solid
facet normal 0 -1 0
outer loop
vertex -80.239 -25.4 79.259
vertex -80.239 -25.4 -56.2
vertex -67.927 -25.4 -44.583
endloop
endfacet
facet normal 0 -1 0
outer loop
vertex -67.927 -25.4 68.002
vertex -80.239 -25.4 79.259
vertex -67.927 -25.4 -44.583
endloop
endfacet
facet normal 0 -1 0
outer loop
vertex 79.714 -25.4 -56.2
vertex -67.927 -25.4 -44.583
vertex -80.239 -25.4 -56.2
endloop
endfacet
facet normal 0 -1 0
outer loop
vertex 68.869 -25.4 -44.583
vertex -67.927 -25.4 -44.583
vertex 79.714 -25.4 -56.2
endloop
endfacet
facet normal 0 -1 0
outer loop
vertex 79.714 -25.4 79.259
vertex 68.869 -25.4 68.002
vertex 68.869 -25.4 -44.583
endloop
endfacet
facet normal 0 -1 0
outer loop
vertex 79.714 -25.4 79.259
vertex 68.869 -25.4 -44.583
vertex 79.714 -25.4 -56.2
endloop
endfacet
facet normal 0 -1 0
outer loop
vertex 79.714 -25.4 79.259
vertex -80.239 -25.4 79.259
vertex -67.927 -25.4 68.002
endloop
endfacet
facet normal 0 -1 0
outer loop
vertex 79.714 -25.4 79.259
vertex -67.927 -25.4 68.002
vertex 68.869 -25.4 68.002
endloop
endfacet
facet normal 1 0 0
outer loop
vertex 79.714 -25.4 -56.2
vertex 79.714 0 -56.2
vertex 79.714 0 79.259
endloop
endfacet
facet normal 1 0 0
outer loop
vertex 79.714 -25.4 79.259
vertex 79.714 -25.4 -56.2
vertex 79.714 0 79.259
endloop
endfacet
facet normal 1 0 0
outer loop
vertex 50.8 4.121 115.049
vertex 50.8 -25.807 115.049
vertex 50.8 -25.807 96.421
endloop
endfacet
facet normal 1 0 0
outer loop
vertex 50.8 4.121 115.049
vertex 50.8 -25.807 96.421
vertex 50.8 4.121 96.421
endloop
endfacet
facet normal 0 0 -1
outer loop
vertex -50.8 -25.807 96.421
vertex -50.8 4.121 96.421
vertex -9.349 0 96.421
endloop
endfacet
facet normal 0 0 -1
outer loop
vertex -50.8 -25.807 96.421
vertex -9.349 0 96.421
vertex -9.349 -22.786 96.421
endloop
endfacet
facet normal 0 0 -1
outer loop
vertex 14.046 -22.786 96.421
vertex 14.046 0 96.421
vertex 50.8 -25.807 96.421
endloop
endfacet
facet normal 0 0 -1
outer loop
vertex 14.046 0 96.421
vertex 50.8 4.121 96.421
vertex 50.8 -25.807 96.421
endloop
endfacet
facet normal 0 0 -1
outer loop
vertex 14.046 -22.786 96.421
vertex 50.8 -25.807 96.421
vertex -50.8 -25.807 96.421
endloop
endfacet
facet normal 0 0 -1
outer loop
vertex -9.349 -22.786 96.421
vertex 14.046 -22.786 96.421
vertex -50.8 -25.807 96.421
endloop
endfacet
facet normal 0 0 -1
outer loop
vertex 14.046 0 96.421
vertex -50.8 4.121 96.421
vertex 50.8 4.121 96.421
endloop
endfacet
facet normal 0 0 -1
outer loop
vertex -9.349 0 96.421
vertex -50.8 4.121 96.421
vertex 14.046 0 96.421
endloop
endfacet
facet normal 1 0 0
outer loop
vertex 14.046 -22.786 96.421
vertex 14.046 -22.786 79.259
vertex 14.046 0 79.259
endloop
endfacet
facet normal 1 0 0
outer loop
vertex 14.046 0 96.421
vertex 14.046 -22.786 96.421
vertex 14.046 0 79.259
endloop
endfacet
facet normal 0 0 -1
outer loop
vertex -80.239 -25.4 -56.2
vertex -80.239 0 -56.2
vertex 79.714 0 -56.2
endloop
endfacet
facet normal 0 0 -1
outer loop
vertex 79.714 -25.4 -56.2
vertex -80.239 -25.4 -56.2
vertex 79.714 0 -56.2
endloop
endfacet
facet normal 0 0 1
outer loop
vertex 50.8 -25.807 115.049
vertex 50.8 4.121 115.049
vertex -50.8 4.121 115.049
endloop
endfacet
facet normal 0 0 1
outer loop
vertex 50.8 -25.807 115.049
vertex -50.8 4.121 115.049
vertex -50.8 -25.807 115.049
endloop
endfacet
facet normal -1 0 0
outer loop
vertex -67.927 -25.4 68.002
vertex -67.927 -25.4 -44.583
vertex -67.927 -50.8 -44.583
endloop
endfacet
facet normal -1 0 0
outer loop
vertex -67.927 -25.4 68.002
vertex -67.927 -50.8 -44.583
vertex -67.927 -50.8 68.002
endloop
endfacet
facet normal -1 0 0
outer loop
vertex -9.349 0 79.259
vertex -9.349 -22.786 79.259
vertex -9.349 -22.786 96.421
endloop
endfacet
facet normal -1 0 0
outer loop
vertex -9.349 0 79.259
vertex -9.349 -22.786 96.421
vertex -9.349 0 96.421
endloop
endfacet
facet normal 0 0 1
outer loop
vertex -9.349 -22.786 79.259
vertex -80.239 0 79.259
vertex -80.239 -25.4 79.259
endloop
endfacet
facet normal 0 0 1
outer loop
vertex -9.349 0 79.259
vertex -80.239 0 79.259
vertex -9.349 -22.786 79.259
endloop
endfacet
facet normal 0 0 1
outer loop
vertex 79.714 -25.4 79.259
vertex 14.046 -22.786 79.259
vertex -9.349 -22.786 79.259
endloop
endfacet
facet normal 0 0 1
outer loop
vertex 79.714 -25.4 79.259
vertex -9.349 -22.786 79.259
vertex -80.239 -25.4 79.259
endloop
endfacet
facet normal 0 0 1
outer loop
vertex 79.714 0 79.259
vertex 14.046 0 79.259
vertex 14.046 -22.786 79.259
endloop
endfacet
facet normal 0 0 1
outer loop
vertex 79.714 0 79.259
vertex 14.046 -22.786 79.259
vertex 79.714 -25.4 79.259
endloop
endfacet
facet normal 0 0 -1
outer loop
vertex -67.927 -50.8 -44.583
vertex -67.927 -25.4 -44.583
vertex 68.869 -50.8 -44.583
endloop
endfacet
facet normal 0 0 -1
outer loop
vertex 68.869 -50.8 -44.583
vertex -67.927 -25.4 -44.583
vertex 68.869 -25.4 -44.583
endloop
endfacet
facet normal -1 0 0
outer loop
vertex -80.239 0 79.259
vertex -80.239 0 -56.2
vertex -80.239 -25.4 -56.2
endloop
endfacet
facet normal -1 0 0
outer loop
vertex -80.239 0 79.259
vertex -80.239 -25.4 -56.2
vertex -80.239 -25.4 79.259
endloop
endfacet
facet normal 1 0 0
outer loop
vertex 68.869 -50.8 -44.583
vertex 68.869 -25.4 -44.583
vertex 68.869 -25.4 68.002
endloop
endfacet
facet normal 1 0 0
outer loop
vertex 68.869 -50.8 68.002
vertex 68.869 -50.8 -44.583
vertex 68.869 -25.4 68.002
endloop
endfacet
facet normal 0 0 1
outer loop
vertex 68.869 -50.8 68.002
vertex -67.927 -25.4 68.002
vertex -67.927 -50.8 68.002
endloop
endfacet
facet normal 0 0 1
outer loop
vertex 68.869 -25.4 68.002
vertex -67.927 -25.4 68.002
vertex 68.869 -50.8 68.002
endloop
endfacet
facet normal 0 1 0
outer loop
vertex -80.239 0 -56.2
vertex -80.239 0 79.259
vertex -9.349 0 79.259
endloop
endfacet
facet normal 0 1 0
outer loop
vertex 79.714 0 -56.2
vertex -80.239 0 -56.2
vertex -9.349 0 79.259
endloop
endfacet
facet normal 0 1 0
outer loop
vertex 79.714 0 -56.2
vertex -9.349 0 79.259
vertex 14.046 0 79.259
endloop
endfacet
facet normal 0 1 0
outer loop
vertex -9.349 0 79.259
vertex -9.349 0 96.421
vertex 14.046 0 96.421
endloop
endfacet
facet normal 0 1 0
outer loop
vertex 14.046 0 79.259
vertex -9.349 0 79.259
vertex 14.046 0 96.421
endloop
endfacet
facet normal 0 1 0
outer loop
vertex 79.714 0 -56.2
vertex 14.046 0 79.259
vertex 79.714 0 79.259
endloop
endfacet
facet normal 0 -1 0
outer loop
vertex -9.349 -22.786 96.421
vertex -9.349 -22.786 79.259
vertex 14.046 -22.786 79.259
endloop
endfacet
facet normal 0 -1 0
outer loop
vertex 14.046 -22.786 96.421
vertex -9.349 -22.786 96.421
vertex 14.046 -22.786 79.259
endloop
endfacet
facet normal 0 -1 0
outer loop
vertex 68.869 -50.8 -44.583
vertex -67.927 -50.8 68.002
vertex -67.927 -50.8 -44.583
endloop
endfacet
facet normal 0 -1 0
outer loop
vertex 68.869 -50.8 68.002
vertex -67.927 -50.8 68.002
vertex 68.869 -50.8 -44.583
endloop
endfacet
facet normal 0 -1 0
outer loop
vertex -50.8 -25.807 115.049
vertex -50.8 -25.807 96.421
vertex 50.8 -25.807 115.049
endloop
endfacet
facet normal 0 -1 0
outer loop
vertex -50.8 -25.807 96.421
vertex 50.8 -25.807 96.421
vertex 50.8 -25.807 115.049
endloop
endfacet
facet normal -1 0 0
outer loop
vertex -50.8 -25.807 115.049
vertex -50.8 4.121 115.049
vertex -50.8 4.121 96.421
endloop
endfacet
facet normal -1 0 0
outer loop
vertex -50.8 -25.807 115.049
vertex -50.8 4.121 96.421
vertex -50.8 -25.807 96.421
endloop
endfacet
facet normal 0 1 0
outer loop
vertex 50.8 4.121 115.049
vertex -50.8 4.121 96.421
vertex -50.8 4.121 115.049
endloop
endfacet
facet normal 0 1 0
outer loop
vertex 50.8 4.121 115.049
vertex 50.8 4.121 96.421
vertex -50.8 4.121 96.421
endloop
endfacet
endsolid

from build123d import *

# Parameters (mm, degrees)
F0_W     = 159.953385
F0_H     = 135.459002
F1_DEPTH = 25.4
F2_W     = 23.394922
F2_H     = 22.785936
F3_DEPTH = 101.6
F4_W     = 29.928277
F4_H     = 18.628203
F5_DEPTH = 50.8
F6_W     = 136.795349
F6_H     = 112.584971
F7_DEPTH = 50.8
F8_W     = 29.928277
F8_H     = 18.628203
F9_DEPTH = 50.8


with BuildPart() as f1:
    # F0 (on Front) → F1 (new body)
    with BuildSketch(Plane.XZ):
        with Locations((-0.262774, 11.529313)):
            Rectangle(F0_W, F0_H)
    extrude(amount=F1_DEPTH)

    # F2 (on Top) → F3 (join)
    with BuildSketch(Plane.XY):
        with Locations((2.348405, -11.392968)):
            Rectangle(F2_W, F2_H)
    extrude(amount=F3_DEPTH)

    # F4 (on Right) → F5 (join)
    with BuildSketch(Plane.YZ):
        with Locations((-10.842666, 105.735038)):
            Rectangle(F4_W, F4_H)
    extrude(amount=F5_DEPTH)

    # F6 (on Front) → F7 (join)
    with BuildSketch(Plane.XZ):
        with Locations((0.471081, 11.709642)):
            Rectangle(F6_W, F6_H)
    extrude(amount=F7_DEPTH)

    # F8 (on face) → F9 (join)
    with BuildSketch(Plane(origin=(0, 0, 0), x_dir=(0, -1, 0), z_dir=(-1, 0, 0))):
        with Locations((10.842666, 105.735038)):
            Rectangle(F8_W, F8_H)
    extrude(amount=F9_DEPTH)


solid = f1.part
